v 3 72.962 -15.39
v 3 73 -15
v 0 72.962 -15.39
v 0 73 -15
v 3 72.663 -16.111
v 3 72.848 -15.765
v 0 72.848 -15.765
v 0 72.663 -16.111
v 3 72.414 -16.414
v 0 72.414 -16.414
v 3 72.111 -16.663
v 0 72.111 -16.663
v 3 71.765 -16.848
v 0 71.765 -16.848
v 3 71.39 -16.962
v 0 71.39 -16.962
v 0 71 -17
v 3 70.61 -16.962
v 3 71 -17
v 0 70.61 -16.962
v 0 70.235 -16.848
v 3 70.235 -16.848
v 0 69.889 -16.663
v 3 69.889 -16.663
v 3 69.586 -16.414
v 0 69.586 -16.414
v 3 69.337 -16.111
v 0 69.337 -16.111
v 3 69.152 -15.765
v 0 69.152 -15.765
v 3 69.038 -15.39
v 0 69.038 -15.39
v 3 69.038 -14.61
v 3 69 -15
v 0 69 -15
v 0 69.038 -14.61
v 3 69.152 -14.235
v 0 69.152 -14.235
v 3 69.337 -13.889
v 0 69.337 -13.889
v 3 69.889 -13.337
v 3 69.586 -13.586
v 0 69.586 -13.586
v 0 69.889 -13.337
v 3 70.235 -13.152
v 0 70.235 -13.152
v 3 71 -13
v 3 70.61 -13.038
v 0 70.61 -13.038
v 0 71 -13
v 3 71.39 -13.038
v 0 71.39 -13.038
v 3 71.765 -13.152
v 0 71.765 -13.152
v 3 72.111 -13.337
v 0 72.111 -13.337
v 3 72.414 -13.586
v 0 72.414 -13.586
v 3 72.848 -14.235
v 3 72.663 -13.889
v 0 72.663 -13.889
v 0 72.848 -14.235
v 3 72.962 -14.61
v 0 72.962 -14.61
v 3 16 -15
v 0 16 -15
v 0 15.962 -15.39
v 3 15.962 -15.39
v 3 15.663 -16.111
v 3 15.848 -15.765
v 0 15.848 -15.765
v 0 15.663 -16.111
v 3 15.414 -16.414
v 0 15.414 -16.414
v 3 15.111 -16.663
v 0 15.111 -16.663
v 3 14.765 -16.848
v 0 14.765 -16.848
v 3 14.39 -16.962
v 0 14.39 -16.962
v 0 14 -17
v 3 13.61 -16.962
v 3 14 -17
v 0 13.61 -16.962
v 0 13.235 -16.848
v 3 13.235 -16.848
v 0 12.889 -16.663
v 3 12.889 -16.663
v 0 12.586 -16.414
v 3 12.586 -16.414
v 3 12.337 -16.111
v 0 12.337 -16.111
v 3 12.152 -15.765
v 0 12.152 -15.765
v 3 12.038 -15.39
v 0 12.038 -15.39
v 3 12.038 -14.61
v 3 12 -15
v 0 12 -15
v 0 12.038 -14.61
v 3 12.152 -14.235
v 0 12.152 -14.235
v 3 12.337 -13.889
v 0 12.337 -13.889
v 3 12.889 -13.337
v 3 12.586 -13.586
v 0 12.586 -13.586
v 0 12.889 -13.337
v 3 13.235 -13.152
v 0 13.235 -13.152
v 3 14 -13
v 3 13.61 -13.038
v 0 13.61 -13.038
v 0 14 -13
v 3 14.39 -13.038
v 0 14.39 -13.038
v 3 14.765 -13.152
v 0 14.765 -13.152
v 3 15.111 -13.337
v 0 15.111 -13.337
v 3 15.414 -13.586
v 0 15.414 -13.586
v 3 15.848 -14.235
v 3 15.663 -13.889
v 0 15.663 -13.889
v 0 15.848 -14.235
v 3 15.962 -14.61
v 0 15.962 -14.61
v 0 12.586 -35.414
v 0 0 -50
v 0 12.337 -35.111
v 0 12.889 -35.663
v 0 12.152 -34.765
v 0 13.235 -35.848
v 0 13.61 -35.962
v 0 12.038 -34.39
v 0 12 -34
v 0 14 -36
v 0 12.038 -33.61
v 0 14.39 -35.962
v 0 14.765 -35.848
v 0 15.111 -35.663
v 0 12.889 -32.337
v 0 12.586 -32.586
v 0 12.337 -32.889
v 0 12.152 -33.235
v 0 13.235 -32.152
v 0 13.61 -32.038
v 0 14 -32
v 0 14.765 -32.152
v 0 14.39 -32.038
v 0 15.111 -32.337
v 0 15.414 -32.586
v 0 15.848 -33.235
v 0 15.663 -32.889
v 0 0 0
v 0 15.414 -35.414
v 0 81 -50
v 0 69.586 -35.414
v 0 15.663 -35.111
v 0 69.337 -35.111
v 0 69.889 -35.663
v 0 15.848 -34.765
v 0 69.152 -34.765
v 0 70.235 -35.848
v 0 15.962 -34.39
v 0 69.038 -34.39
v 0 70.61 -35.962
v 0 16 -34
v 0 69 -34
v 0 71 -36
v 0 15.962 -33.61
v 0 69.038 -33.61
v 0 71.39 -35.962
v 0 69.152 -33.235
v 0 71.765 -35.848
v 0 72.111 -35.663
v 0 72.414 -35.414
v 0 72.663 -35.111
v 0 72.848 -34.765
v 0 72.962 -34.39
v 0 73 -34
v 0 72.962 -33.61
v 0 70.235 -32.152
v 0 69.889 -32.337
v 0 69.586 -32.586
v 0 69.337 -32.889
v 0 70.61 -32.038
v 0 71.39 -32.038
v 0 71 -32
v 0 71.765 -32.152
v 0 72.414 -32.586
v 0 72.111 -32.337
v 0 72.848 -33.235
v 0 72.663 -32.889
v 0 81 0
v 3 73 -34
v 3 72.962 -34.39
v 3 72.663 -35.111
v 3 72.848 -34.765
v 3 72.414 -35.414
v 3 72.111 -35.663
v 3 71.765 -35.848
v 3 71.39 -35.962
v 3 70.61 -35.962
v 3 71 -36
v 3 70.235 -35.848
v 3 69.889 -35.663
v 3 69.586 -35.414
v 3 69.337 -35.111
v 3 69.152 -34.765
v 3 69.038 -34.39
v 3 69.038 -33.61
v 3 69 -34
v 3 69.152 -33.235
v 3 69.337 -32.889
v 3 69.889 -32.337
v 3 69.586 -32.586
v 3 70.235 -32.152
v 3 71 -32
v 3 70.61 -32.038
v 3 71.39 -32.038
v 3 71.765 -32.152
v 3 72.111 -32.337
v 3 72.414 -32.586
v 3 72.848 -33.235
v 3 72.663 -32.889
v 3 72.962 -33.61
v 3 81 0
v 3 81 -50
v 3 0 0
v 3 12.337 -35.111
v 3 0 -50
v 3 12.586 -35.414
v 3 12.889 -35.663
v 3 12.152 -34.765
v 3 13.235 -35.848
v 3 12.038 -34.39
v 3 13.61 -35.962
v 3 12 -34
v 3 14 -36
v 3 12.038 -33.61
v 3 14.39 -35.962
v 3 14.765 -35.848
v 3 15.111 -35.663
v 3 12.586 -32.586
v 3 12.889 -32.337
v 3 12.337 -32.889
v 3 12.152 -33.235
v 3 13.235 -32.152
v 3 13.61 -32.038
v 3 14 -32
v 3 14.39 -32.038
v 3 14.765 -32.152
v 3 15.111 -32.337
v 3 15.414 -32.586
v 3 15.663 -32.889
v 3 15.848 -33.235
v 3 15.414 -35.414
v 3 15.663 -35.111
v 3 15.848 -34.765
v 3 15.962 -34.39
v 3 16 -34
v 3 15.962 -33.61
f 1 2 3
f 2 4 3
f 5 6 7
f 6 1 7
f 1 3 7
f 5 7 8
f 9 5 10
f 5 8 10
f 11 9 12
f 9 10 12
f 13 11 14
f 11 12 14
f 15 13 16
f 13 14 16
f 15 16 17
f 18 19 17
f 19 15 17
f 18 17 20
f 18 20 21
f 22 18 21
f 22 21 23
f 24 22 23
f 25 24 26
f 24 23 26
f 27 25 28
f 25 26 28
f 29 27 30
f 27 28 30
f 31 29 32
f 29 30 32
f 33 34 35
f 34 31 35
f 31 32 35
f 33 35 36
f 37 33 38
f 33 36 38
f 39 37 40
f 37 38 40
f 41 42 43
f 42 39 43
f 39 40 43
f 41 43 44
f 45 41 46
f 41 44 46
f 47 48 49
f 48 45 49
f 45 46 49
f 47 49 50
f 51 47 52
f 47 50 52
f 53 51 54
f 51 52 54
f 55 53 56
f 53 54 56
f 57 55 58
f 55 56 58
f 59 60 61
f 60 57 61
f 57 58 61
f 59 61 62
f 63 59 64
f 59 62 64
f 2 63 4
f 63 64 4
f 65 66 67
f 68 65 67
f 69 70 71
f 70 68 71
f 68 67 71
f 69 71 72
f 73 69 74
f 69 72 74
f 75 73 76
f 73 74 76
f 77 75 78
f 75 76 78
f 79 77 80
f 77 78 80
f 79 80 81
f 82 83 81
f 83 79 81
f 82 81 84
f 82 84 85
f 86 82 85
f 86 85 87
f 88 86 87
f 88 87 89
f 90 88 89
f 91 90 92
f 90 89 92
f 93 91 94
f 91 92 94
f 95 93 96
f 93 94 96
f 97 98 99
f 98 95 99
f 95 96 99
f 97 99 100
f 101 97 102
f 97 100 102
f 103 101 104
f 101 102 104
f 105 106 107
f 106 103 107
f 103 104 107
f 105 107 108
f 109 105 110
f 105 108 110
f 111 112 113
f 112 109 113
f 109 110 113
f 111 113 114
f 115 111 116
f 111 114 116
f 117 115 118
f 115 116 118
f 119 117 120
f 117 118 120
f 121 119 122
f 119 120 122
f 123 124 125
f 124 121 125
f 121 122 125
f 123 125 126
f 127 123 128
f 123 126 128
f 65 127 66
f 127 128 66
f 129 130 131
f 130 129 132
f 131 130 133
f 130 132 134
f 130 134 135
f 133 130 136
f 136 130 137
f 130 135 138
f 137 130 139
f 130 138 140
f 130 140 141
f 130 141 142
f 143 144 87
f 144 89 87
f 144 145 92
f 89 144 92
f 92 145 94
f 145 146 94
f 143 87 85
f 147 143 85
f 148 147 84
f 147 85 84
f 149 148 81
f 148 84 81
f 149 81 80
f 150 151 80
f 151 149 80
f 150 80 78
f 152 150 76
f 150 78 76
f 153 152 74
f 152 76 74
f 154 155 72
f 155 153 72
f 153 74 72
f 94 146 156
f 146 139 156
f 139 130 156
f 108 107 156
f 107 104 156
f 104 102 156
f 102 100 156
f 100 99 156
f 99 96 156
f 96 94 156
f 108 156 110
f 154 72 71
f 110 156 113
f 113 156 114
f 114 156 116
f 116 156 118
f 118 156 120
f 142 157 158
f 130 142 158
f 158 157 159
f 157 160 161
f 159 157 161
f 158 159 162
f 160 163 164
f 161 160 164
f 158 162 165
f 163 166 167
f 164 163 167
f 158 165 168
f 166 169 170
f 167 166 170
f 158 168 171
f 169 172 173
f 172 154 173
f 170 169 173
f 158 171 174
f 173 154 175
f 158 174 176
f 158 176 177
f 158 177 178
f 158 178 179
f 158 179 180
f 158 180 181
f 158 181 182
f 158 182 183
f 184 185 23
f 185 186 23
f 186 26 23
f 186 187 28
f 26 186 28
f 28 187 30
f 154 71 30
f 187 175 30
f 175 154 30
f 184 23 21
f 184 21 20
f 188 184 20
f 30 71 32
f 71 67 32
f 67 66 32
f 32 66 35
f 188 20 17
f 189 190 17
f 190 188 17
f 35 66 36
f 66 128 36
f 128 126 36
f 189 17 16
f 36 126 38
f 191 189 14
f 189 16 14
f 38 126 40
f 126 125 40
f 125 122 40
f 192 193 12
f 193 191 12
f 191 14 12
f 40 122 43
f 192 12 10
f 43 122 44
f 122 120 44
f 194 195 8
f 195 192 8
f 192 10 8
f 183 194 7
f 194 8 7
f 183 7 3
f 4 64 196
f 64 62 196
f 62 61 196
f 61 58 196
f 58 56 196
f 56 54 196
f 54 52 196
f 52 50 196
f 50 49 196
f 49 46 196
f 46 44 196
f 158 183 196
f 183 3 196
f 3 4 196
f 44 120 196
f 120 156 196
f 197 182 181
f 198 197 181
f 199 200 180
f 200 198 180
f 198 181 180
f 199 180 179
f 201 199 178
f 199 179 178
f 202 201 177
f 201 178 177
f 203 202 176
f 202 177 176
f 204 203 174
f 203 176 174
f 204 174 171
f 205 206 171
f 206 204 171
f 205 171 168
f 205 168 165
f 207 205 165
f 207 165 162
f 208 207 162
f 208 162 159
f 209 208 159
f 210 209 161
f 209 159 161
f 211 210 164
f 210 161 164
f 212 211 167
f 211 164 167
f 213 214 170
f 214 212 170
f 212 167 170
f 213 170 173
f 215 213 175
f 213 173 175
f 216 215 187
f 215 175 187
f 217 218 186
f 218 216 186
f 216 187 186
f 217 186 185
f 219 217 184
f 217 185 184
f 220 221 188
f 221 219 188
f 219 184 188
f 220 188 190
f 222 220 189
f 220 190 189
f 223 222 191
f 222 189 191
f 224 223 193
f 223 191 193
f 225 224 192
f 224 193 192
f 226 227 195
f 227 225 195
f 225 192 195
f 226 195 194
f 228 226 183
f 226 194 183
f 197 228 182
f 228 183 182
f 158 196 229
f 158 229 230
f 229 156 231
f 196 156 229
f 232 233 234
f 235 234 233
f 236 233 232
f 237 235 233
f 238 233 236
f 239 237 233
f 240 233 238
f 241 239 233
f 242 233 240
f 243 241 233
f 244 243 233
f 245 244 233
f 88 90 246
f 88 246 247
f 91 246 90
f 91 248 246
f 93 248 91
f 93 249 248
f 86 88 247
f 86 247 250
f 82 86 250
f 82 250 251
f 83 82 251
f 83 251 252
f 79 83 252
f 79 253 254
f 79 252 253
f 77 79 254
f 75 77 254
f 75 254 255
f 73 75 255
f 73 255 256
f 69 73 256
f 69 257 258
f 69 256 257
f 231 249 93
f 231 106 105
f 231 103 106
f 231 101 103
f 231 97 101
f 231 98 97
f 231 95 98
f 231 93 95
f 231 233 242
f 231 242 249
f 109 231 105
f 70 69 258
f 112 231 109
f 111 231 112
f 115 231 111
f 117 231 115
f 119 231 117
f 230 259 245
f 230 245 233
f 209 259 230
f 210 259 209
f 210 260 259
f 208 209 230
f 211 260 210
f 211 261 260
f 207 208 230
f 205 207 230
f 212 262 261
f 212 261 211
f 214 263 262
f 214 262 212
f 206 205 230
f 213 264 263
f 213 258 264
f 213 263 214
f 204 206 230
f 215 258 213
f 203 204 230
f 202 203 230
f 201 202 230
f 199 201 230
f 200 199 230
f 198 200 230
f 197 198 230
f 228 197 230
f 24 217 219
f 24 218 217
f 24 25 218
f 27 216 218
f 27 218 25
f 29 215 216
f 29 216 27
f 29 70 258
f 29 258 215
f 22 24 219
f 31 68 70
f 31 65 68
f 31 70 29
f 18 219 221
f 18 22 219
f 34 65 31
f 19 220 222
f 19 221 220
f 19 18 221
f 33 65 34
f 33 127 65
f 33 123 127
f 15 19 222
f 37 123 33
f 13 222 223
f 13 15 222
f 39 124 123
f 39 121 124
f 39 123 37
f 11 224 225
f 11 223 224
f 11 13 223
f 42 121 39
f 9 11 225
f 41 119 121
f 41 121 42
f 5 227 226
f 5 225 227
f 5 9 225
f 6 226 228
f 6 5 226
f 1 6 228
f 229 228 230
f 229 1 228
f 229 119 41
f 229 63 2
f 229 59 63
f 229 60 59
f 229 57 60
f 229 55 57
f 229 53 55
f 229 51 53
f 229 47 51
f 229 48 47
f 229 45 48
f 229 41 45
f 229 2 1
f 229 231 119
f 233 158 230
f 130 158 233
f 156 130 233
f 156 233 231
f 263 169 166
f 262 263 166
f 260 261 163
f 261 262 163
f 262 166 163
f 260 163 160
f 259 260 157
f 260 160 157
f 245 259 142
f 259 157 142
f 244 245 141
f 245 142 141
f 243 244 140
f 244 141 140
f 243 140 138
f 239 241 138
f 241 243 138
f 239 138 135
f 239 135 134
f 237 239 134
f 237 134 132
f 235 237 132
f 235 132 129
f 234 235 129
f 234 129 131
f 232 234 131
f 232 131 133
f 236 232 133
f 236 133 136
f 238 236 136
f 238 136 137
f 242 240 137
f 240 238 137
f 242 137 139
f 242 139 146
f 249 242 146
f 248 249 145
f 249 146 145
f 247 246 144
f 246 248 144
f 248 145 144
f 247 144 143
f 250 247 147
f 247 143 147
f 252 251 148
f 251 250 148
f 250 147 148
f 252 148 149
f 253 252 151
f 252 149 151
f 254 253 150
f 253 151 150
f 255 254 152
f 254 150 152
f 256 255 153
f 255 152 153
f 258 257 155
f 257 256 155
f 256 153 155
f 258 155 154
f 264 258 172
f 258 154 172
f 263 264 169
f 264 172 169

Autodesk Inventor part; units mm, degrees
ref_plane "YZ Plane" through (0, 0, 0) normal (1, 0, 0) x (0, 1, 0)
ref_plane "XZ Plane" through (0, 0, 0) normal (0, 1, 0) x (-1, 0, 0)
ref_plane "XY Plane" through (0, 0, 0) normal (0, 0, 1) x (1, 0, 0)
sketch "Sketch1" plane through (0, 0, 0) normal (1, 0, 0) x (0, 1, 0)
  line L0 (0, 0) -> (81, 0)
  line L1 (81, 0) -> (81, -50)
  line L2 (81, -50) -> (0, -50)
  line L3 (0, -50) -> (0, 0)
  circle A0 centre (71, -15) radius 2
  circle A1 centre (71, -34) radius 2
  circle A2 centre (14, -15) radius 2
  circle A3 centre (14, -34) radius 2
  dimension "d0" = 81
  dimension "d1" = 50
  dimension "d2" = 4
  dimension "d3" = 15
  dimension "d4" = 4
  dimension "d5" = 16
  dimension "d6" = 4
  dimension "d7" = 15
  dimension "d8" = 4
  dimension "d9" = 57
  dimension "d11" = 10
  dimension "d12" = 57
  dimension "d13" = 10
extrude "Extrusion1" add sketch "Sketch1" along normal blind 3
sketch "Sketch5" plane through (0, 81, 0) normal (0, 1, 0) x (1, 0, 0)
  circle A0 centre (7, 25) radius 4
  line L0 (0, 0) -> (3, 0) projected
  line L1 (3, 50) -> (3, 0) projected
  dimension "d26" = 8
  dimension "d27" = 25
  dimension "d28" = 4
extrude "Extrusion3" add sketch "Sketch5" against normal blind 81
sketch "Sketch8" plane through (0, 81, 0) normal (0, 1, 0) x (1, 0, 0)
  circle A0 centre (7, 25) radius 4
  line L0 (0, 0) -> (3, 0) projected
  line L1 (3, 50) -> (3, 25) projected
  point P0 (3, 29)
  dimension "d33" = 8
  dimension "d34" = 25
  dimension "d35" = 4
extrude "Extrusion5" cut sketch "Sketch8" against normal blind 81
